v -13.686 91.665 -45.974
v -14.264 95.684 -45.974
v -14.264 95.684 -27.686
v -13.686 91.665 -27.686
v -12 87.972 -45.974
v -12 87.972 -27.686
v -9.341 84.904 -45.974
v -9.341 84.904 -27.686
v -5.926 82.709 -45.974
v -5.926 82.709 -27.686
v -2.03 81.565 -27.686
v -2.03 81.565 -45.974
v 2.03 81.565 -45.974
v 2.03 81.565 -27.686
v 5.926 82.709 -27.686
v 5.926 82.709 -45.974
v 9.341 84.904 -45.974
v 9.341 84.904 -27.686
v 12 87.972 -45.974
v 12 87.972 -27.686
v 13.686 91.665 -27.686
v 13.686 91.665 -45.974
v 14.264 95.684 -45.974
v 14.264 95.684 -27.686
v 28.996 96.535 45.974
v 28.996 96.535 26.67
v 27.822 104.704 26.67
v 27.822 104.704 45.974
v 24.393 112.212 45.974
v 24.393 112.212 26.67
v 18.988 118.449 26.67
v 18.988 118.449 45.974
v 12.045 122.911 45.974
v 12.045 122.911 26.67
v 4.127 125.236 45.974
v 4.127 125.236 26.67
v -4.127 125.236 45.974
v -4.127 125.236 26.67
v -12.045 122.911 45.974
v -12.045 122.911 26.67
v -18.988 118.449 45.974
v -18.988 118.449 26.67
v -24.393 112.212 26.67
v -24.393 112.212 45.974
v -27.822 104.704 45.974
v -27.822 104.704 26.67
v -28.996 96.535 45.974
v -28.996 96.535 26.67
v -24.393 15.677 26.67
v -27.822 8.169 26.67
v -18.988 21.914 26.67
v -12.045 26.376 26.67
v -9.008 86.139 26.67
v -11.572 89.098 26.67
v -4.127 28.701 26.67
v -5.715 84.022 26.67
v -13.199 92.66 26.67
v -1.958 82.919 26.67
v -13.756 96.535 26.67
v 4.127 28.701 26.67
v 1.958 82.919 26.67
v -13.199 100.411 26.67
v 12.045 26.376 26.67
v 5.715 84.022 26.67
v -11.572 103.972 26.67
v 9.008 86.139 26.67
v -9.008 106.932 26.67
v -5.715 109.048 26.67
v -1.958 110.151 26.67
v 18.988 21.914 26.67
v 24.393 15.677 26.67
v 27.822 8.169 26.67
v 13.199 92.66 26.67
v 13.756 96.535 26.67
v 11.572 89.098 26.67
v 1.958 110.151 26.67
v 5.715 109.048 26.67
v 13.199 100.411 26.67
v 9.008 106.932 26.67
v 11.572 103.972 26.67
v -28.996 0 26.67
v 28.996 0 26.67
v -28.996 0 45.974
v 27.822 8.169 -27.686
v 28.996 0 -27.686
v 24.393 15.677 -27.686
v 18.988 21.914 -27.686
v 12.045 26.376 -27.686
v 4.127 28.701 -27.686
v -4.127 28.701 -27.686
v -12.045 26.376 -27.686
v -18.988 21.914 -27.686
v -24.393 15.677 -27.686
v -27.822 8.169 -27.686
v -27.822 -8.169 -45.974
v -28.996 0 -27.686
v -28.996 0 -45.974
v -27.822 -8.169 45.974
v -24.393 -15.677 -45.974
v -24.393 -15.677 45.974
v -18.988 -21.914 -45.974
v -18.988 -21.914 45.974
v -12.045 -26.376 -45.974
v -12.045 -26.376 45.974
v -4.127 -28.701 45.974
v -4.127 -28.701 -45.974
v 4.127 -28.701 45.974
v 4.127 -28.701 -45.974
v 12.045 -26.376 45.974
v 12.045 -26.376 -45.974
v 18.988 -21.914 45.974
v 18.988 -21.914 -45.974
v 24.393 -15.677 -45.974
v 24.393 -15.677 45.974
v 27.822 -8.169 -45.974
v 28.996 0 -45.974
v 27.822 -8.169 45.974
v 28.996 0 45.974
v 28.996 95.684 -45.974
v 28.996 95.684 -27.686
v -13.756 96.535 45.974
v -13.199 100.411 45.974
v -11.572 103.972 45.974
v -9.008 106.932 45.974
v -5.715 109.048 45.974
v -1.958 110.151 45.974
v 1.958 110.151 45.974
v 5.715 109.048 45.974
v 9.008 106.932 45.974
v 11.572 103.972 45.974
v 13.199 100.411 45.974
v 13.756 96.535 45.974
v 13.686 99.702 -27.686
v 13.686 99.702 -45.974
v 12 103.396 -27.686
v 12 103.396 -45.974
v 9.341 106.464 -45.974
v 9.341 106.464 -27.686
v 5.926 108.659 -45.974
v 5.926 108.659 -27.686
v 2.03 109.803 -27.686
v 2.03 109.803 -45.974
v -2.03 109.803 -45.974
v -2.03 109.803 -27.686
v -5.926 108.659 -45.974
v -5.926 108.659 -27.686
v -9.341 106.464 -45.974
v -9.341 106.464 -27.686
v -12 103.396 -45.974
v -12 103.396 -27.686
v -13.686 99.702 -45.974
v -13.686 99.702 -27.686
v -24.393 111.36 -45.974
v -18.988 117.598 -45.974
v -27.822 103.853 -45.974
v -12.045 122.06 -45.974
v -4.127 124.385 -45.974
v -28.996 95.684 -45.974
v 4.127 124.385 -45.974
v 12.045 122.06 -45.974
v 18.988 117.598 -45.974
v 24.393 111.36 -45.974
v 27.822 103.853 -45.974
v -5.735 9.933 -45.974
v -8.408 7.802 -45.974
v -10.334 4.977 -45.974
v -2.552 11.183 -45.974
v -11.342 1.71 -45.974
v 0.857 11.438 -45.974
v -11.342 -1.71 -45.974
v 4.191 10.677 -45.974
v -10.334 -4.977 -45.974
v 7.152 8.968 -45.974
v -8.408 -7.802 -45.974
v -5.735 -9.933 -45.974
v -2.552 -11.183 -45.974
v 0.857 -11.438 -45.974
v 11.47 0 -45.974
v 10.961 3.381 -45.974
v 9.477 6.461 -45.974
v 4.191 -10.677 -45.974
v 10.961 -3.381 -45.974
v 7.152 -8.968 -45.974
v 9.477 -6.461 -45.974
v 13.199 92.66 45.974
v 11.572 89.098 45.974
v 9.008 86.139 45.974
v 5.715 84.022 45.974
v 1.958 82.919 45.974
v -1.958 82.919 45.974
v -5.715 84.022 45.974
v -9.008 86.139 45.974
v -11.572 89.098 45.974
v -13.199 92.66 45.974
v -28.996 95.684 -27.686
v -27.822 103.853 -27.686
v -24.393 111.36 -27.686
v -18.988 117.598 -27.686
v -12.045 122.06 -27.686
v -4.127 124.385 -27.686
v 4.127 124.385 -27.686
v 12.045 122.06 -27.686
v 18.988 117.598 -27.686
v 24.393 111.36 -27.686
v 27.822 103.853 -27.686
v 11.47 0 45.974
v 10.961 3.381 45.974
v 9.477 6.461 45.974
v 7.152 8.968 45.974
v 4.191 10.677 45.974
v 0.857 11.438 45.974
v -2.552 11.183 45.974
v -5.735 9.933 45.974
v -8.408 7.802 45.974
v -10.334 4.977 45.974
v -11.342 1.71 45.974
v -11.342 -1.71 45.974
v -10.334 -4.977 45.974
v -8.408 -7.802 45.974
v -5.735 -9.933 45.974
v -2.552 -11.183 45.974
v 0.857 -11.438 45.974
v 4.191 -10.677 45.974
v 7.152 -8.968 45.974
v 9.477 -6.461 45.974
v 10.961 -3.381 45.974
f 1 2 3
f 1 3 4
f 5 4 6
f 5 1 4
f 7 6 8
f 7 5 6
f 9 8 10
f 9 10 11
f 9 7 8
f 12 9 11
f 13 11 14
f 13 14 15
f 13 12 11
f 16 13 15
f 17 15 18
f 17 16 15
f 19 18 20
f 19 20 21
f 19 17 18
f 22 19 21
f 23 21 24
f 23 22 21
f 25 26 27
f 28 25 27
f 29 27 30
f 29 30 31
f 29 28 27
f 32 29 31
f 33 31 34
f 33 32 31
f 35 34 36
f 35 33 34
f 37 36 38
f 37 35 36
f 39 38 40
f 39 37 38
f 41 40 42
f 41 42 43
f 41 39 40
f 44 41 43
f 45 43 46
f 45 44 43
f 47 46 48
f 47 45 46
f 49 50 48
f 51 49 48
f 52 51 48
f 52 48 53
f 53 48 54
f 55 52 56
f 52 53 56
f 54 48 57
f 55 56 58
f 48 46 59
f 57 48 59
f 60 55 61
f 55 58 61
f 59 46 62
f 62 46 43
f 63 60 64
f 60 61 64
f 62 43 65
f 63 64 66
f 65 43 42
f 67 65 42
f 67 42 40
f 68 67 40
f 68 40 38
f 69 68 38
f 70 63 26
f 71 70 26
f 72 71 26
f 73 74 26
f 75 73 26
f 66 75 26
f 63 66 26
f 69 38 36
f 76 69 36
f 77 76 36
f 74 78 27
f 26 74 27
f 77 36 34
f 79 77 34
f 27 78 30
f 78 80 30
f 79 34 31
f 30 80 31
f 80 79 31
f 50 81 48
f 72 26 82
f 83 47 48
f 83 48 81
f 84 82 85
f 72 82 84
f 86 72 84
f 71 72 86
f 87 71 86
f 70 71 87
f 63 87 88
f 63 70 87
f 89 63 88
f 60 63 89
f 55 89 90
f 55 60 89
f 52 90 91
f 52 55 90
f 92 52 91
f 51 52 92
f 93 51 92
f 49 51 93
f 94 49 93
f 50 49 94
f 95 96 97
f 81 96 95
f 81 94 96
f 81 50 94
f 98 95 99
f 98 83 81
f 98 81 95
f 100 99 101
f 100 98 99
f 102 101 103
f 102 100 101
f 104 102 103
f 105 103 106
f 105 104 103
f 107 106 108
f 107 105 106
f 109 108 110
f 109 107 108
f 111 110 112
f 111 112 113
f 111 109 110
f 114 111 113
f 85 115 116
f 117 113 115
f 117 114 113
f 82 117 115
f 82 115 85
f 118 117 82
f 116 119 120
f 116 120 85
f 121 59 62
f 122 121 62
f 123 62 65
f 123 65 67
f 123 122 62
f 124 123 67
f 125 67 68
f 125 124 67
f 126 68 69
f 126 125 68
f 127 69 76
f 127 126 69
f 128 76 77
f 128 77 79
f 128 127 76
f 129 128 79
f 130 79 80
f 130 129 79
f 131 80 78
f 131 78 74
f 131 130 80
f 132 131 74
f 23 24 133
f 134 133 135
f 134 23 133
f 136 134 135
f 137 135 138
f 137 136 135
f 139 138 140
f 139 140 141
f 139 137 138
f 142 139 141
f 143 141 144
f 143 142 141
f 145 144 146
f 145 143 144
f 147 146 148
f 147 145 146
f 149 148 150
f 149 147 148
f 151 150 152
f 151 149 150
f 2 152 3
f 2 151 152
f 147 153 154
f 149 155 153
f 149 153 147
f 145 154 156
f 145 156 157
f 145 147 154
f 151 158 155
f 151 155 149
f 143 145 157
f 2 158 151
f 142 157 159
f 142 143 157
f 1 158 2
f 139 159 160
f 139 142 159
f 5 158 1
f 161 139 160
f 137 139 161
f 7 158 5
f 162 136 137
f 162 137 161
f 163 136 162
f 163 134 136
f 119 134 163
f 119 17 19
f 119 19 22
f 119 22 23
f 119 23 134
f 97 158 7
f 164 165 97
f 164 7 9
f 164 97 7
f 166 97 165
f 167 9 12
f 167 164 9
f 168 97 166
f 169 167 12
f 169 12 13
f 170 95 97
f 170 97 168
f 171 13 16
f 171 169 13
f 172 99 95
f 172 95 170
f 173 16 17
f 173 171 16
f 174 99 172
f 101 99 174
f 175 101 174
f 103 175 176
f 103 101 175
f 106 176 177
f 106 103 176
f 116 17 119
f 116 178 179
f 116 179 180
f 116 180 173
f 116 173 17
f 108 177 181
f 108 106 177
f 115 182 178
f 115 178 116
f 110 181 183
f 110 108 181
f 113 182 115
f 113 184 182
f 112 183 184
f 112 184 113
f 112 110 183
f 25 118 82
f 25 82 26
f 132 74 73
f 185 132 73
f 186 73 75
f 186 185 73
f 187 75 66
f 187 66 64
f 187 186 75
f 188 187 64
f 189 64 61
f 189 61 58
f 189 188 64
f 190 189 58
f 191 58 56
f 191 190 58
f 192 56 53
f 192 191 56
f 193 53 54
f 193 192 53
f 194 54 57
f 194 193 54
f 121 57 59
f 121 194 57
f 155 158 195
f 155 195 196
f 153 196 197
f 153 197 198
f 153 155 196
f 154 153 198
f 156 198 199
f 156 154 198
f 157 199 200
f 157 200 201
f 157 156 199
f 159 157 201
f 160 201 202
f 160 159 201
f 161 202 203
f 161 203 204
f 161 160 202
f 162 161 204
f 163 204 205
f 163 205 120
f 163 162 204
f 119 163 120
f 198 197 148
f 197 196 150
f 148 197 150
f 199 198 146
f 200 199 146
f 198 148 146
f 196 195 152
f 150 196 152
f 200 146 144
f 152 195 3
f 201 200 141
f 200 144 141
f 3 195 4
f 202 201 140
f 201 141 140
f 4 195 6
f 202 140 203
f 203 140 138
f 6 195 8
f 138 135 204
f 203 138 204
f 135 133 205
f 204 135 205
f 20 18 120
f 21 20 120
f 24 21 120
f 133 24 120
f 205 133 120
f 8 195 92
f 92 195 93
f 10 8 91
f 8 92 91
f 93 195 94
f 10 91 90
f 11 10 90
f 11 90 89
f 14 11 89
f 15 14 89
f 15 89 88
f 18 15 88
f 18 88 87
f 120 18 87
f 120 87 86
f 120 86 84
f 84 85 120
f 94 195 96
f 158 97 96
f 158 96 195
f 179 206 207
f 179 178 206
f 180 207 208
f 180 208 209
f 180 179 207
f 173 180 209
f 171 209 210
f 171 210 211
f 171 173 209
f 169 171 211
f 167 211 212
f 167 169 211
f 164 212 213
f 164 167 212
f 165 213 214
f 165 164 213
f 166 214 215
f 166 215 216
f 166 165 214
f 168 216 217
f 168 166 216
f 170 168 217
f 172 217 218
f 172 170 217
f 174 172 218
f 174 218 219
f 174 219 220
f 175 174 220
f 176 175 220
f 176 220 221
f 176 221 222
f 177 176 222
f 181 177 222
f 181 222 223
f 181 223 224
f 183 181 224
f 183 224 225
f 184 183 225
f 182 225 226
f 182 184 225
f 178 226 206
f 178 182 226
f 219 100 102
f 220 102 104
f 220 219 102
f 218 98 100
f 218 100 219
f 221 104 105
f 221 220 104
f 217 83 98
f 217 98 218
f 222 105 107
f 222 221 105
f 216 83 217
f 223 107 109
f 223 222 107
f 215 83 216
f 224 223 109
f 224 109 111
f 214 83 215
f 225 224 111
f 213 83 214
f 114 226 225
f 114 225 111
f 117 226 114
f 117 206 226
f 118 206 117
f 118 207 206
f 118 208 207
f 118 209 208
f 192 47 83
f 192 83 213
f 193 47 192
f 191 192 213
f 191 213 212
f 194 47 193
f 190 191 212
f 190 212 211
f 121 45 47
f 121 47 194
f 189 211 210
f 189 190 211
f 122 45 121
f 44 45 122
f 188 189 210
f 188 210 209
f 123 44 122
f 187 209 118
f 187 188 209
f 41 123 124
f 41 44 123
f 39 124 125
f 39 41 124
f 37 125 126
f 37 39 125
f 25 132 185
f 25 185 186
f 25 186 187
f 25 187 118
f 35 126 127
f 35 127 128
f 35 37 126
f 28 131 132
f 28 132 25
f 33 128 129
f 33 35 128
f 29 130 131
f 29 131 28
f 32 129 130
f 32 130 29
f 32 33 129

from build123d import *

# Parameters (mm, degrees)
F0_R     = 28.9961675247
F0_R_2   = 11.4701678976
F1_DEPTH = 45.974
F3_DEPTH = 19.304
F5_DEPTH = 18.288


# Not quite as in the source:
# - ends of sketch curves that miss each other by under 0.0002 mm in the source are joined


with BuildPart() as f1:
    # F0 (on Top) → F1 (new body, symmetric)
    with BuildSketch(Plane.XY):
        Circle(F0_R)
        Circle(F0_R_2, mode=Mode.SUBTRACT)
    extrude(amount=F1_DEPTH, both=True)

    # F2 (on face) → F3 (join)
    with BuildSketch(Plane.XY.offset(45.974)):
        with BuildLine():
            ThreePointArc((-28.9961675247, 96.5353175998), (0, 67.5391500751), (28.9961675247, 96.5353175998))
            ThreePointArc((28.9961675247, 96.5353175998), (0, 125.5314851244), (-28.9961675247, 96.5353175998))
        make_face()
        with BuildLine():
            ThreePointArc((-13.7561708689, 96.5353175998), (0, 110.2914884686), (13.7561708689, 96.5353175998))
            ThreePointArc((13.7561708689, 96.5353175998), (0, 82.7791500751), (-13.7561708689, 96.5353175998))
        make_face(mode=Mode.SUBTRACT)
        with BuildLine():
            Line((-28.9961675247, 96.5353175998), (-28.9961675247, 0))
            ThreePointArc((-28.9961675247, 0), (0, 28.9961675247), (28.9961675247, 0))
            Line((28.9961675247, 0), (28.9961675247, 96.5353175998))
            ThreePointArc((28.9961675247, 96.5353175998), (0, 67.5391500751), (-28.9961675247, 96.5353175998))
        make_face()
    extrude(amount=-F3_DEPTH)

    # F4 (on face) → F5 (join)
    with BuildSketch(Plane(origin=(0, 0, -45.974), x_dir=(1, 0, 0), z_dir=(0, 0, -1))):
        with BuildLine():
            Line((28.9961675247, -95.6837162375), (28.9961675247, 0))
            ThreePointArc((28.9961675247, 0), (0, -28.9961675247), (-28.9961675247, 0))
            Line((-28.9961675247, 0), (-28.9961675247, -95.6837162375))
            ThreePointArc((-28.9961675247, -95.6837162375), (0, -66.6875487129), (28.9961675247, -95.6837162375))
        make_face()
        with BuildLine():
            ThreePointArc((-28.9961675247, -95.6837162375), (0, -124.6798837622), (28.9961675247, -95.6837162375))
            ThreePointArc((28.9961675247, -95.6837162375), (0, -66.6875487129), (-28.9961675247, -95.6837162375))
        make_face()
        with BuildLine():
            ThreePointArc((14.2641663551, -95.6837162375), (0, -109.9478825927), (-14.2641663551, -95.6837162375))
            ThreePointArc((-14.2641663551, -95.6837162375), (0, -81.4195498824), (14.2641663551, -95.6837162375))
        make_face(mode=Mode.SUBTRACT)
    extrude(amount=-F5_DEPTH)


solid = f1.part
